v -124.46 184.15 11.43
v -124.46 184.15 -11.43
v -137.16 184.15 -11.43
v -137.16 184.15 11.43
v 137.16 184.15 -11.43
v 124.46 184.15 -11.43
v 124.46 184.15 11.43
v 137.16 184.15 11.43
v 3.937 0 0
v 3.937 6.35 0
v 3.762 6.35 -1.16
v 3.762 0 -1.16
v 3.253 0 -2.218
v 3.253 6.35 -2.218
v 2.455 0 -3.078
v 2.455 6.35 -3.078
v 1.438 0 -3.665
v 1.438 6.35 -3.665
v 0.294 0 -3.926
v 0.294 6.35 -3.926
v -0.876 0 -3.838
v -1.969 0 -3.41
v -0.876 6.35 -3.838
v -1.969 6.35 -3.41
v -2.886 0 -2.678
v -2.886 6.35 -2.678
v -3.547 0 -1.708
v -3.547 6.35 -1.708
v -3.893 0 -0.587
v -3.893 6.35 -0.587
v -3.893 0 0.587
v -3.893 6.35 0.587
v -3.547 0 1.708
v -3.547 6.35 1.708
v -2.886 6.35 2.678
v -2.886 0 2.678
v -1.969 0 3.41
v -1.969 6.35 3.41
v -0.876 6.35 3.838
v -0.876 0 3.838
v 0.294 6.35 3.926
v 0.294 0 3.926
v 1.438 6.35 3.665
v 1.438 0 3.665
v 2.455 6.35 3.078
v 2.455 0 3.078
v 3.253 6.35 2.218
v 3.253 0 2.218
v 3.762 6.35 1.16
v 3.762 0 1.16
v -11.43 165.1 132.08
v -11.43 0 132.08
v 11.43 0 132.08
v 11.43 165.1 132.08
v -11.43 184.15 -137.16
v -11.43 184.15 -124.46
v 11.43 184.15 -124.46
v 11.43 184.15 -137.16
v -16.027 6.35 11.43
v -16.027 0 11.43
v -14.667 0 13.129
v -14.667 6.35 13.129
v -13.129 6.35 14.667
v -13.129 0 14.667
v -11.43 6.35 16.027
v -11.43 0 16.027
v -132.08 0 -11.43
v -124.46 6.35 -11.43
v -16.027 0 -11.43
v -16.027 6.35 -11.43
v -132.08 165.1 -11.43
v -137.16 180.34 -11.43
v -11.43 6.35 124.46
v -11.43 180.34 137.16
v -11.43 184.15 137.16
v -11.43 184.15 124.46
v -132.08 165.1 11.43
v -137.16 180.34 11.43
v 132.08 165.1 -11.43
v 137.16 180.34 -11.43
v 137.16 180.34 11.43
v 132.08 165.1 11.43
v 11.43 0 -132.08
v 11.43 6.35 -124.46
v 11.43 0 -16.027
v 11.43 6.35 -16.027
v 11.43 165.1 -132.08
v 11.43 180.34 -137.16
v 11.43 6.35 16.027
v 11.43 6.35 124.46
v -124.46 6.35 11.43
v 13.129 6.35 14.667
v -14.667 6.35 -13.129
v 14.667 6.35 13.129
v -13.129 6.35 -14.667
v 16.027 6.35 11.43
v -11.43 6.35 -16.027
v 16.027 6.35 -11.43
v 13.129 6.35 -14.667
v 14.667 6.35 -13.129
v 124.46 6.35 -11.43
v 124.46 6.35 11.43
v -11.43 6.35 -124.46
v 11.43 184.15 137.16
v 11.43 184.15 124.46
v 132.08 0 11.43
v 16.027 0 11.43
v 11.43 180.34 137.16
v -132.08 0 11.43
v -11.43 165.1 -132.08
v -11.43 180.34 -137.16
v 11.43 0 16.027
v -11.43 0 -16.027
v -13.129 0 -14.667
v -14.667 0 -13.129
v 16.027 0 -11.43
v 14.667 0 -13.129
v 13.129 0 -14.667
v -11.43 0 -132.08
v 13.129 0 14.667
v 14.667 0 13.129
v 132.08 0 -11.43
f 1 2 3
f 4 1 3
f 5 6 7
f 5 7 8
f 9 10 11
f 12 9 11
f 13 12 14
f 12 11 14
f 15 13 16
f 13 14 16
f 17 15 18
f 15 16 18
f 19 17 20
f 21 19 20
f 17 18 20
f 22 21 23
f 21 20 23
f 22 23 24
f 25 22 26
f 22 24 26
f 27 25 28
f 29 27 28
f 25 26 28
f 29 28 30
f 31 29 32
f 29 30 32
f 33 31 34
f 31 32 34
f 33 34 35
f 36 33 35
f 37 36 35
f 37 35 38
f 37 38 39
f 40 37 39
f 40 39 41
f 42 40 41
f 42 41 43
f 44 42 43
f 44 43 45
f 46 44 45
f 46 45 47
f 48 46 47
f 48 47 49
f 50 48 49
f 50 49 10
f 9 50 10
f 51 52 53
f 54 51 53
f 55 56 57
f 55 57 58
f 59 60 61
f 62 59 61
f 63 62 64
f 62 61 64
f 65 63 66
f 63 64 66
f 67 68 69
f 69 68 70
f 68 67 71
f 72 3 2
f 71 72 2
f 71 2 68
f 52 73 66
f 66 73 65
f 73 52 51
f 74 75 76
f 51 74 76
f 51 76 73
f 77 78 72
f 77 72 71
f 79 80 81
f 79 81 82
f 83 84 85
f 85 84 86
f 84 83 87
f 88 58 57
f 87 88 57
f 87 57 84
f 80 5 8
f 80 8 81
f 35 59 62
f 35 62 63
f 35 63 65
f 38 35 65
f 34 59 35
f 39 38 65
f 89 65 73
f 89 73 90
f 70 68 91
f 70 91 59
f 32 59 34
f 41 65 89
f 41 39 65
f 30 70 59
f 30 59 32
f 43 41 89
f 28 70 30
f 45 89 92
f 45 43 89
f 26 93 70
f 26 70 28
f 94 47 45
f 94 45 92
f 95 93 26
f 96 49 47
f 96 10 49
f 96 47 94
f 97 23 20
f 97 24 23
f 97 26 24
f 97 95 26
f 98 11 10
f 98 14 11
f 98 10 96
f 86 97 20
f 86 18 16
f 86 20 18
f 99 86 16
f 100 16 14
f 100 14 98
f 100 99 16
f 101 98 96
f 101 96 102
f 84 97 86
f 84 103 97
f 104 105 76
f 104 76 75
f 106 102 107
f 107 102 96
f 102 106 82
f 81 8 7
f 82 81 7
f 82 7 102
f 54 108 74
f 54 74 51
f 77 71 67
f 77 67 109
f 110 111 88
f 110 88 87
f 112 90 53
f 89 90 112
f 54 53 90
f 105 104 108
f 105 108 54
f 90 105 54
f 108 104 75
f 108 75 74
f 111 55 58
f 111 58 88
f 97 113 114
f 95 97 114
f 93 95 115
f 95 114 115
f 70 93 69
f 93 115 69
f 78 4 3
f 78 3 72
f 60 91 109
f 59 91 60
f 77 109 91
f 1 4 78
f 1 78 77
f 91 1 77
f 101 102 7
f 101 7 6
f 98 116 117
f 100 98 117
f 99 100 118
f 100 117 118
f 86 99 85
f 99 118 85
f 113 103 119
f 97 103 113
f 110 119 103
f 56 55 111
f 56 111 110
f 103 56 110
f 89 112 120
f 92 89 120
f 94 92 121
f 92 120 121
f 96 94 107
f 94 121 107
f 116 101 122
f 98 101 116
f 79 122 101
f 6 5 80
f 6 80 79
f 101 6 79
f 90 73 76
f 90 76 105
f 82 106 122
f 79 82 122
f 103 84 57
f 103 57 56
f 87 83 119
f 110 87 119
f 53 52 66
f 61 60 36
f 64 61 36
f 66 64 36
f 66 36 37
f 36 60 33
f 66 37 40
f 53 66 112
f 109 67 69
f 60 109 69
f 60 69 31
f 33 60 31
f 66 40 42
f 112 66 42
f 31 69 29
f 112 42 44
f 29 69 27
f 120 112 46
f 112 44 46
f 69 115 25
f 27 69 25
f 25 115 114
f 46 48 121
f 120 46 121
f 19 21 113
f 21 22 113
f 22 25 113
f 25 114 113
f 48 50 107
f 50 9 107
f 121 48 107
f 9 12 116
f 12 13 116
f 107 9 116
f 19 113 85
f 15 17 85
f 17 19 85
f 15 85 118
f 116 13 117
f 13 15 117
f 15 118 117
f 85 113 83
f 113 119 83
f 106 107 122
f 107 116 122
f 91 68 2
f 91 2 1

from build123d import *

# Parameters (mm, degrees)
BOSS_EXTRUDE3_DEPTH = 6.35
SKETCH9_R           = 3.937
CUT_EXTRUDE4_DEPTH  = 127
SKETCH8_W           = 22.86
SKETCH8_H           = 7.62
BOSS_EXTRUDE4_DEPTH = 177.8
CIRPATTERN1_COUNT   = 4
BOSS_EXTRUDE6_DEPTH = 22.86
CIRPATTERN2_COUNT   = 4


with BuildPart() as part:
    # Sketch5 → Boss-Extrude3 (new body)
    with BuildSketch(Plane(origin=(0, 0, 0), x_dir=(1, 0, 0), z_dir=(0, 1, 0))):
        with BuildLine():
            Line((-16.026675419, 11.43), (-132.08, 11.43))
            Line((-132.08, 11.43), (-132.08, -11.43))
            Line((-132.08, -11.43), (-16.026675419, -11.43))
            ThreePointArc((-16.026675419, -11.43), (-13.919396988, -13.919396988), (-11.43, -16.026675419))
            Line((-11.43, -16.026675419), (-11.43, -132.08))
            Line((-11.43, -132.08), (11.43, -132.08))
            Line((11.43, -132.08), (11.43, -16.026675419))
            ThreePointArc((11.43, -16.026675419), (13.919396988, -13.919396988), (16.026675419, -11.43))
            Line((16.026675419, -11.43), (132.08, -11.43))
            Line((132.08, -11.43), (132.08, 11.43))
            Line((132.08, 11.43), (16.026675419, 11.43))
            ThreePointArc((16.026675419, 11.43), (13.919396988, 13.919396988), (11.43, 16.026675419))
            Line((11.43, 16.026675419), (11.43, 132.08))
            Line((11.43, 132.08), (-11.43, 132.08))
            Line((-11.43, 132.08), (-11.43, 16.026675419))
            ThreePointArc((-11.43, 16.026675419), (-13.919396988, 13.919396988), (-16.026675419, 11.43))
        make_face()
    extrude(amount=BOSS_EXTRUDE3_DEPTH)

    # Sketch9 → Cut-Extrude4 (cut)
    with BuildSketch(Plane(origin=(0, 6.35, 0), x_dir=(1, 0, 0), z_dir=(0, 1, 0))):
        Circle(SKETCH9_R)
    extrude(amount=-CUT_EXTRUDE4_DEPTH, mode=Mode.SUBTRACT)

    # Sketch8 → Boss-Extrude4 (add)
    with BuildSketch(Plane(origin=(0, 6.35, 0), x_dir=(1, 0, 0), z_dir=(0, 1, 0))):
        with Locations((0, -128.27)):
            Rectangle(SKETCH8_W, SKETCH8_H)
    boss_extrude4 = extrude(amount=BOSS_EXTRUDE4_DEPTH)

    # CirPattern1: Boss-Extrude4 ×4 about axis
    cirpattern1_axis = Axis((0, 0, 0), (0, 1, 0))
    for i in range(1, CIRPATTERN1_COUNT):
        add(boss_extrude4.rotate(cirpattern1_axis, i * 360 / CIRPATTERN1_COUNT))

    # Sketch13 → Boss-Extrude6 (add)
    with BuildSketch(Plane.XY.offset(11.43)):
        Polygon((-132.08, 184.15), (-137.16, 184.15), (-137.16, 180.34), (-132.08, 165.1), align=None)
    boss_extrude6 = extrude(amount=-BOSS_EXTRUDE6_DEPTH)

    # CirPattern2: Boss-Extrude6 ×4 about axis
    cirpattern2_axis = Axis((0, 0, 0), (0, 1, 0))
    for i in range(1, CIRPATTERN2_COUNT):
        add(boss_extrude6.rotate(cirpattern2_axis, i * 360 / CIRPATTERN2_COUNT))


solid = part.part
